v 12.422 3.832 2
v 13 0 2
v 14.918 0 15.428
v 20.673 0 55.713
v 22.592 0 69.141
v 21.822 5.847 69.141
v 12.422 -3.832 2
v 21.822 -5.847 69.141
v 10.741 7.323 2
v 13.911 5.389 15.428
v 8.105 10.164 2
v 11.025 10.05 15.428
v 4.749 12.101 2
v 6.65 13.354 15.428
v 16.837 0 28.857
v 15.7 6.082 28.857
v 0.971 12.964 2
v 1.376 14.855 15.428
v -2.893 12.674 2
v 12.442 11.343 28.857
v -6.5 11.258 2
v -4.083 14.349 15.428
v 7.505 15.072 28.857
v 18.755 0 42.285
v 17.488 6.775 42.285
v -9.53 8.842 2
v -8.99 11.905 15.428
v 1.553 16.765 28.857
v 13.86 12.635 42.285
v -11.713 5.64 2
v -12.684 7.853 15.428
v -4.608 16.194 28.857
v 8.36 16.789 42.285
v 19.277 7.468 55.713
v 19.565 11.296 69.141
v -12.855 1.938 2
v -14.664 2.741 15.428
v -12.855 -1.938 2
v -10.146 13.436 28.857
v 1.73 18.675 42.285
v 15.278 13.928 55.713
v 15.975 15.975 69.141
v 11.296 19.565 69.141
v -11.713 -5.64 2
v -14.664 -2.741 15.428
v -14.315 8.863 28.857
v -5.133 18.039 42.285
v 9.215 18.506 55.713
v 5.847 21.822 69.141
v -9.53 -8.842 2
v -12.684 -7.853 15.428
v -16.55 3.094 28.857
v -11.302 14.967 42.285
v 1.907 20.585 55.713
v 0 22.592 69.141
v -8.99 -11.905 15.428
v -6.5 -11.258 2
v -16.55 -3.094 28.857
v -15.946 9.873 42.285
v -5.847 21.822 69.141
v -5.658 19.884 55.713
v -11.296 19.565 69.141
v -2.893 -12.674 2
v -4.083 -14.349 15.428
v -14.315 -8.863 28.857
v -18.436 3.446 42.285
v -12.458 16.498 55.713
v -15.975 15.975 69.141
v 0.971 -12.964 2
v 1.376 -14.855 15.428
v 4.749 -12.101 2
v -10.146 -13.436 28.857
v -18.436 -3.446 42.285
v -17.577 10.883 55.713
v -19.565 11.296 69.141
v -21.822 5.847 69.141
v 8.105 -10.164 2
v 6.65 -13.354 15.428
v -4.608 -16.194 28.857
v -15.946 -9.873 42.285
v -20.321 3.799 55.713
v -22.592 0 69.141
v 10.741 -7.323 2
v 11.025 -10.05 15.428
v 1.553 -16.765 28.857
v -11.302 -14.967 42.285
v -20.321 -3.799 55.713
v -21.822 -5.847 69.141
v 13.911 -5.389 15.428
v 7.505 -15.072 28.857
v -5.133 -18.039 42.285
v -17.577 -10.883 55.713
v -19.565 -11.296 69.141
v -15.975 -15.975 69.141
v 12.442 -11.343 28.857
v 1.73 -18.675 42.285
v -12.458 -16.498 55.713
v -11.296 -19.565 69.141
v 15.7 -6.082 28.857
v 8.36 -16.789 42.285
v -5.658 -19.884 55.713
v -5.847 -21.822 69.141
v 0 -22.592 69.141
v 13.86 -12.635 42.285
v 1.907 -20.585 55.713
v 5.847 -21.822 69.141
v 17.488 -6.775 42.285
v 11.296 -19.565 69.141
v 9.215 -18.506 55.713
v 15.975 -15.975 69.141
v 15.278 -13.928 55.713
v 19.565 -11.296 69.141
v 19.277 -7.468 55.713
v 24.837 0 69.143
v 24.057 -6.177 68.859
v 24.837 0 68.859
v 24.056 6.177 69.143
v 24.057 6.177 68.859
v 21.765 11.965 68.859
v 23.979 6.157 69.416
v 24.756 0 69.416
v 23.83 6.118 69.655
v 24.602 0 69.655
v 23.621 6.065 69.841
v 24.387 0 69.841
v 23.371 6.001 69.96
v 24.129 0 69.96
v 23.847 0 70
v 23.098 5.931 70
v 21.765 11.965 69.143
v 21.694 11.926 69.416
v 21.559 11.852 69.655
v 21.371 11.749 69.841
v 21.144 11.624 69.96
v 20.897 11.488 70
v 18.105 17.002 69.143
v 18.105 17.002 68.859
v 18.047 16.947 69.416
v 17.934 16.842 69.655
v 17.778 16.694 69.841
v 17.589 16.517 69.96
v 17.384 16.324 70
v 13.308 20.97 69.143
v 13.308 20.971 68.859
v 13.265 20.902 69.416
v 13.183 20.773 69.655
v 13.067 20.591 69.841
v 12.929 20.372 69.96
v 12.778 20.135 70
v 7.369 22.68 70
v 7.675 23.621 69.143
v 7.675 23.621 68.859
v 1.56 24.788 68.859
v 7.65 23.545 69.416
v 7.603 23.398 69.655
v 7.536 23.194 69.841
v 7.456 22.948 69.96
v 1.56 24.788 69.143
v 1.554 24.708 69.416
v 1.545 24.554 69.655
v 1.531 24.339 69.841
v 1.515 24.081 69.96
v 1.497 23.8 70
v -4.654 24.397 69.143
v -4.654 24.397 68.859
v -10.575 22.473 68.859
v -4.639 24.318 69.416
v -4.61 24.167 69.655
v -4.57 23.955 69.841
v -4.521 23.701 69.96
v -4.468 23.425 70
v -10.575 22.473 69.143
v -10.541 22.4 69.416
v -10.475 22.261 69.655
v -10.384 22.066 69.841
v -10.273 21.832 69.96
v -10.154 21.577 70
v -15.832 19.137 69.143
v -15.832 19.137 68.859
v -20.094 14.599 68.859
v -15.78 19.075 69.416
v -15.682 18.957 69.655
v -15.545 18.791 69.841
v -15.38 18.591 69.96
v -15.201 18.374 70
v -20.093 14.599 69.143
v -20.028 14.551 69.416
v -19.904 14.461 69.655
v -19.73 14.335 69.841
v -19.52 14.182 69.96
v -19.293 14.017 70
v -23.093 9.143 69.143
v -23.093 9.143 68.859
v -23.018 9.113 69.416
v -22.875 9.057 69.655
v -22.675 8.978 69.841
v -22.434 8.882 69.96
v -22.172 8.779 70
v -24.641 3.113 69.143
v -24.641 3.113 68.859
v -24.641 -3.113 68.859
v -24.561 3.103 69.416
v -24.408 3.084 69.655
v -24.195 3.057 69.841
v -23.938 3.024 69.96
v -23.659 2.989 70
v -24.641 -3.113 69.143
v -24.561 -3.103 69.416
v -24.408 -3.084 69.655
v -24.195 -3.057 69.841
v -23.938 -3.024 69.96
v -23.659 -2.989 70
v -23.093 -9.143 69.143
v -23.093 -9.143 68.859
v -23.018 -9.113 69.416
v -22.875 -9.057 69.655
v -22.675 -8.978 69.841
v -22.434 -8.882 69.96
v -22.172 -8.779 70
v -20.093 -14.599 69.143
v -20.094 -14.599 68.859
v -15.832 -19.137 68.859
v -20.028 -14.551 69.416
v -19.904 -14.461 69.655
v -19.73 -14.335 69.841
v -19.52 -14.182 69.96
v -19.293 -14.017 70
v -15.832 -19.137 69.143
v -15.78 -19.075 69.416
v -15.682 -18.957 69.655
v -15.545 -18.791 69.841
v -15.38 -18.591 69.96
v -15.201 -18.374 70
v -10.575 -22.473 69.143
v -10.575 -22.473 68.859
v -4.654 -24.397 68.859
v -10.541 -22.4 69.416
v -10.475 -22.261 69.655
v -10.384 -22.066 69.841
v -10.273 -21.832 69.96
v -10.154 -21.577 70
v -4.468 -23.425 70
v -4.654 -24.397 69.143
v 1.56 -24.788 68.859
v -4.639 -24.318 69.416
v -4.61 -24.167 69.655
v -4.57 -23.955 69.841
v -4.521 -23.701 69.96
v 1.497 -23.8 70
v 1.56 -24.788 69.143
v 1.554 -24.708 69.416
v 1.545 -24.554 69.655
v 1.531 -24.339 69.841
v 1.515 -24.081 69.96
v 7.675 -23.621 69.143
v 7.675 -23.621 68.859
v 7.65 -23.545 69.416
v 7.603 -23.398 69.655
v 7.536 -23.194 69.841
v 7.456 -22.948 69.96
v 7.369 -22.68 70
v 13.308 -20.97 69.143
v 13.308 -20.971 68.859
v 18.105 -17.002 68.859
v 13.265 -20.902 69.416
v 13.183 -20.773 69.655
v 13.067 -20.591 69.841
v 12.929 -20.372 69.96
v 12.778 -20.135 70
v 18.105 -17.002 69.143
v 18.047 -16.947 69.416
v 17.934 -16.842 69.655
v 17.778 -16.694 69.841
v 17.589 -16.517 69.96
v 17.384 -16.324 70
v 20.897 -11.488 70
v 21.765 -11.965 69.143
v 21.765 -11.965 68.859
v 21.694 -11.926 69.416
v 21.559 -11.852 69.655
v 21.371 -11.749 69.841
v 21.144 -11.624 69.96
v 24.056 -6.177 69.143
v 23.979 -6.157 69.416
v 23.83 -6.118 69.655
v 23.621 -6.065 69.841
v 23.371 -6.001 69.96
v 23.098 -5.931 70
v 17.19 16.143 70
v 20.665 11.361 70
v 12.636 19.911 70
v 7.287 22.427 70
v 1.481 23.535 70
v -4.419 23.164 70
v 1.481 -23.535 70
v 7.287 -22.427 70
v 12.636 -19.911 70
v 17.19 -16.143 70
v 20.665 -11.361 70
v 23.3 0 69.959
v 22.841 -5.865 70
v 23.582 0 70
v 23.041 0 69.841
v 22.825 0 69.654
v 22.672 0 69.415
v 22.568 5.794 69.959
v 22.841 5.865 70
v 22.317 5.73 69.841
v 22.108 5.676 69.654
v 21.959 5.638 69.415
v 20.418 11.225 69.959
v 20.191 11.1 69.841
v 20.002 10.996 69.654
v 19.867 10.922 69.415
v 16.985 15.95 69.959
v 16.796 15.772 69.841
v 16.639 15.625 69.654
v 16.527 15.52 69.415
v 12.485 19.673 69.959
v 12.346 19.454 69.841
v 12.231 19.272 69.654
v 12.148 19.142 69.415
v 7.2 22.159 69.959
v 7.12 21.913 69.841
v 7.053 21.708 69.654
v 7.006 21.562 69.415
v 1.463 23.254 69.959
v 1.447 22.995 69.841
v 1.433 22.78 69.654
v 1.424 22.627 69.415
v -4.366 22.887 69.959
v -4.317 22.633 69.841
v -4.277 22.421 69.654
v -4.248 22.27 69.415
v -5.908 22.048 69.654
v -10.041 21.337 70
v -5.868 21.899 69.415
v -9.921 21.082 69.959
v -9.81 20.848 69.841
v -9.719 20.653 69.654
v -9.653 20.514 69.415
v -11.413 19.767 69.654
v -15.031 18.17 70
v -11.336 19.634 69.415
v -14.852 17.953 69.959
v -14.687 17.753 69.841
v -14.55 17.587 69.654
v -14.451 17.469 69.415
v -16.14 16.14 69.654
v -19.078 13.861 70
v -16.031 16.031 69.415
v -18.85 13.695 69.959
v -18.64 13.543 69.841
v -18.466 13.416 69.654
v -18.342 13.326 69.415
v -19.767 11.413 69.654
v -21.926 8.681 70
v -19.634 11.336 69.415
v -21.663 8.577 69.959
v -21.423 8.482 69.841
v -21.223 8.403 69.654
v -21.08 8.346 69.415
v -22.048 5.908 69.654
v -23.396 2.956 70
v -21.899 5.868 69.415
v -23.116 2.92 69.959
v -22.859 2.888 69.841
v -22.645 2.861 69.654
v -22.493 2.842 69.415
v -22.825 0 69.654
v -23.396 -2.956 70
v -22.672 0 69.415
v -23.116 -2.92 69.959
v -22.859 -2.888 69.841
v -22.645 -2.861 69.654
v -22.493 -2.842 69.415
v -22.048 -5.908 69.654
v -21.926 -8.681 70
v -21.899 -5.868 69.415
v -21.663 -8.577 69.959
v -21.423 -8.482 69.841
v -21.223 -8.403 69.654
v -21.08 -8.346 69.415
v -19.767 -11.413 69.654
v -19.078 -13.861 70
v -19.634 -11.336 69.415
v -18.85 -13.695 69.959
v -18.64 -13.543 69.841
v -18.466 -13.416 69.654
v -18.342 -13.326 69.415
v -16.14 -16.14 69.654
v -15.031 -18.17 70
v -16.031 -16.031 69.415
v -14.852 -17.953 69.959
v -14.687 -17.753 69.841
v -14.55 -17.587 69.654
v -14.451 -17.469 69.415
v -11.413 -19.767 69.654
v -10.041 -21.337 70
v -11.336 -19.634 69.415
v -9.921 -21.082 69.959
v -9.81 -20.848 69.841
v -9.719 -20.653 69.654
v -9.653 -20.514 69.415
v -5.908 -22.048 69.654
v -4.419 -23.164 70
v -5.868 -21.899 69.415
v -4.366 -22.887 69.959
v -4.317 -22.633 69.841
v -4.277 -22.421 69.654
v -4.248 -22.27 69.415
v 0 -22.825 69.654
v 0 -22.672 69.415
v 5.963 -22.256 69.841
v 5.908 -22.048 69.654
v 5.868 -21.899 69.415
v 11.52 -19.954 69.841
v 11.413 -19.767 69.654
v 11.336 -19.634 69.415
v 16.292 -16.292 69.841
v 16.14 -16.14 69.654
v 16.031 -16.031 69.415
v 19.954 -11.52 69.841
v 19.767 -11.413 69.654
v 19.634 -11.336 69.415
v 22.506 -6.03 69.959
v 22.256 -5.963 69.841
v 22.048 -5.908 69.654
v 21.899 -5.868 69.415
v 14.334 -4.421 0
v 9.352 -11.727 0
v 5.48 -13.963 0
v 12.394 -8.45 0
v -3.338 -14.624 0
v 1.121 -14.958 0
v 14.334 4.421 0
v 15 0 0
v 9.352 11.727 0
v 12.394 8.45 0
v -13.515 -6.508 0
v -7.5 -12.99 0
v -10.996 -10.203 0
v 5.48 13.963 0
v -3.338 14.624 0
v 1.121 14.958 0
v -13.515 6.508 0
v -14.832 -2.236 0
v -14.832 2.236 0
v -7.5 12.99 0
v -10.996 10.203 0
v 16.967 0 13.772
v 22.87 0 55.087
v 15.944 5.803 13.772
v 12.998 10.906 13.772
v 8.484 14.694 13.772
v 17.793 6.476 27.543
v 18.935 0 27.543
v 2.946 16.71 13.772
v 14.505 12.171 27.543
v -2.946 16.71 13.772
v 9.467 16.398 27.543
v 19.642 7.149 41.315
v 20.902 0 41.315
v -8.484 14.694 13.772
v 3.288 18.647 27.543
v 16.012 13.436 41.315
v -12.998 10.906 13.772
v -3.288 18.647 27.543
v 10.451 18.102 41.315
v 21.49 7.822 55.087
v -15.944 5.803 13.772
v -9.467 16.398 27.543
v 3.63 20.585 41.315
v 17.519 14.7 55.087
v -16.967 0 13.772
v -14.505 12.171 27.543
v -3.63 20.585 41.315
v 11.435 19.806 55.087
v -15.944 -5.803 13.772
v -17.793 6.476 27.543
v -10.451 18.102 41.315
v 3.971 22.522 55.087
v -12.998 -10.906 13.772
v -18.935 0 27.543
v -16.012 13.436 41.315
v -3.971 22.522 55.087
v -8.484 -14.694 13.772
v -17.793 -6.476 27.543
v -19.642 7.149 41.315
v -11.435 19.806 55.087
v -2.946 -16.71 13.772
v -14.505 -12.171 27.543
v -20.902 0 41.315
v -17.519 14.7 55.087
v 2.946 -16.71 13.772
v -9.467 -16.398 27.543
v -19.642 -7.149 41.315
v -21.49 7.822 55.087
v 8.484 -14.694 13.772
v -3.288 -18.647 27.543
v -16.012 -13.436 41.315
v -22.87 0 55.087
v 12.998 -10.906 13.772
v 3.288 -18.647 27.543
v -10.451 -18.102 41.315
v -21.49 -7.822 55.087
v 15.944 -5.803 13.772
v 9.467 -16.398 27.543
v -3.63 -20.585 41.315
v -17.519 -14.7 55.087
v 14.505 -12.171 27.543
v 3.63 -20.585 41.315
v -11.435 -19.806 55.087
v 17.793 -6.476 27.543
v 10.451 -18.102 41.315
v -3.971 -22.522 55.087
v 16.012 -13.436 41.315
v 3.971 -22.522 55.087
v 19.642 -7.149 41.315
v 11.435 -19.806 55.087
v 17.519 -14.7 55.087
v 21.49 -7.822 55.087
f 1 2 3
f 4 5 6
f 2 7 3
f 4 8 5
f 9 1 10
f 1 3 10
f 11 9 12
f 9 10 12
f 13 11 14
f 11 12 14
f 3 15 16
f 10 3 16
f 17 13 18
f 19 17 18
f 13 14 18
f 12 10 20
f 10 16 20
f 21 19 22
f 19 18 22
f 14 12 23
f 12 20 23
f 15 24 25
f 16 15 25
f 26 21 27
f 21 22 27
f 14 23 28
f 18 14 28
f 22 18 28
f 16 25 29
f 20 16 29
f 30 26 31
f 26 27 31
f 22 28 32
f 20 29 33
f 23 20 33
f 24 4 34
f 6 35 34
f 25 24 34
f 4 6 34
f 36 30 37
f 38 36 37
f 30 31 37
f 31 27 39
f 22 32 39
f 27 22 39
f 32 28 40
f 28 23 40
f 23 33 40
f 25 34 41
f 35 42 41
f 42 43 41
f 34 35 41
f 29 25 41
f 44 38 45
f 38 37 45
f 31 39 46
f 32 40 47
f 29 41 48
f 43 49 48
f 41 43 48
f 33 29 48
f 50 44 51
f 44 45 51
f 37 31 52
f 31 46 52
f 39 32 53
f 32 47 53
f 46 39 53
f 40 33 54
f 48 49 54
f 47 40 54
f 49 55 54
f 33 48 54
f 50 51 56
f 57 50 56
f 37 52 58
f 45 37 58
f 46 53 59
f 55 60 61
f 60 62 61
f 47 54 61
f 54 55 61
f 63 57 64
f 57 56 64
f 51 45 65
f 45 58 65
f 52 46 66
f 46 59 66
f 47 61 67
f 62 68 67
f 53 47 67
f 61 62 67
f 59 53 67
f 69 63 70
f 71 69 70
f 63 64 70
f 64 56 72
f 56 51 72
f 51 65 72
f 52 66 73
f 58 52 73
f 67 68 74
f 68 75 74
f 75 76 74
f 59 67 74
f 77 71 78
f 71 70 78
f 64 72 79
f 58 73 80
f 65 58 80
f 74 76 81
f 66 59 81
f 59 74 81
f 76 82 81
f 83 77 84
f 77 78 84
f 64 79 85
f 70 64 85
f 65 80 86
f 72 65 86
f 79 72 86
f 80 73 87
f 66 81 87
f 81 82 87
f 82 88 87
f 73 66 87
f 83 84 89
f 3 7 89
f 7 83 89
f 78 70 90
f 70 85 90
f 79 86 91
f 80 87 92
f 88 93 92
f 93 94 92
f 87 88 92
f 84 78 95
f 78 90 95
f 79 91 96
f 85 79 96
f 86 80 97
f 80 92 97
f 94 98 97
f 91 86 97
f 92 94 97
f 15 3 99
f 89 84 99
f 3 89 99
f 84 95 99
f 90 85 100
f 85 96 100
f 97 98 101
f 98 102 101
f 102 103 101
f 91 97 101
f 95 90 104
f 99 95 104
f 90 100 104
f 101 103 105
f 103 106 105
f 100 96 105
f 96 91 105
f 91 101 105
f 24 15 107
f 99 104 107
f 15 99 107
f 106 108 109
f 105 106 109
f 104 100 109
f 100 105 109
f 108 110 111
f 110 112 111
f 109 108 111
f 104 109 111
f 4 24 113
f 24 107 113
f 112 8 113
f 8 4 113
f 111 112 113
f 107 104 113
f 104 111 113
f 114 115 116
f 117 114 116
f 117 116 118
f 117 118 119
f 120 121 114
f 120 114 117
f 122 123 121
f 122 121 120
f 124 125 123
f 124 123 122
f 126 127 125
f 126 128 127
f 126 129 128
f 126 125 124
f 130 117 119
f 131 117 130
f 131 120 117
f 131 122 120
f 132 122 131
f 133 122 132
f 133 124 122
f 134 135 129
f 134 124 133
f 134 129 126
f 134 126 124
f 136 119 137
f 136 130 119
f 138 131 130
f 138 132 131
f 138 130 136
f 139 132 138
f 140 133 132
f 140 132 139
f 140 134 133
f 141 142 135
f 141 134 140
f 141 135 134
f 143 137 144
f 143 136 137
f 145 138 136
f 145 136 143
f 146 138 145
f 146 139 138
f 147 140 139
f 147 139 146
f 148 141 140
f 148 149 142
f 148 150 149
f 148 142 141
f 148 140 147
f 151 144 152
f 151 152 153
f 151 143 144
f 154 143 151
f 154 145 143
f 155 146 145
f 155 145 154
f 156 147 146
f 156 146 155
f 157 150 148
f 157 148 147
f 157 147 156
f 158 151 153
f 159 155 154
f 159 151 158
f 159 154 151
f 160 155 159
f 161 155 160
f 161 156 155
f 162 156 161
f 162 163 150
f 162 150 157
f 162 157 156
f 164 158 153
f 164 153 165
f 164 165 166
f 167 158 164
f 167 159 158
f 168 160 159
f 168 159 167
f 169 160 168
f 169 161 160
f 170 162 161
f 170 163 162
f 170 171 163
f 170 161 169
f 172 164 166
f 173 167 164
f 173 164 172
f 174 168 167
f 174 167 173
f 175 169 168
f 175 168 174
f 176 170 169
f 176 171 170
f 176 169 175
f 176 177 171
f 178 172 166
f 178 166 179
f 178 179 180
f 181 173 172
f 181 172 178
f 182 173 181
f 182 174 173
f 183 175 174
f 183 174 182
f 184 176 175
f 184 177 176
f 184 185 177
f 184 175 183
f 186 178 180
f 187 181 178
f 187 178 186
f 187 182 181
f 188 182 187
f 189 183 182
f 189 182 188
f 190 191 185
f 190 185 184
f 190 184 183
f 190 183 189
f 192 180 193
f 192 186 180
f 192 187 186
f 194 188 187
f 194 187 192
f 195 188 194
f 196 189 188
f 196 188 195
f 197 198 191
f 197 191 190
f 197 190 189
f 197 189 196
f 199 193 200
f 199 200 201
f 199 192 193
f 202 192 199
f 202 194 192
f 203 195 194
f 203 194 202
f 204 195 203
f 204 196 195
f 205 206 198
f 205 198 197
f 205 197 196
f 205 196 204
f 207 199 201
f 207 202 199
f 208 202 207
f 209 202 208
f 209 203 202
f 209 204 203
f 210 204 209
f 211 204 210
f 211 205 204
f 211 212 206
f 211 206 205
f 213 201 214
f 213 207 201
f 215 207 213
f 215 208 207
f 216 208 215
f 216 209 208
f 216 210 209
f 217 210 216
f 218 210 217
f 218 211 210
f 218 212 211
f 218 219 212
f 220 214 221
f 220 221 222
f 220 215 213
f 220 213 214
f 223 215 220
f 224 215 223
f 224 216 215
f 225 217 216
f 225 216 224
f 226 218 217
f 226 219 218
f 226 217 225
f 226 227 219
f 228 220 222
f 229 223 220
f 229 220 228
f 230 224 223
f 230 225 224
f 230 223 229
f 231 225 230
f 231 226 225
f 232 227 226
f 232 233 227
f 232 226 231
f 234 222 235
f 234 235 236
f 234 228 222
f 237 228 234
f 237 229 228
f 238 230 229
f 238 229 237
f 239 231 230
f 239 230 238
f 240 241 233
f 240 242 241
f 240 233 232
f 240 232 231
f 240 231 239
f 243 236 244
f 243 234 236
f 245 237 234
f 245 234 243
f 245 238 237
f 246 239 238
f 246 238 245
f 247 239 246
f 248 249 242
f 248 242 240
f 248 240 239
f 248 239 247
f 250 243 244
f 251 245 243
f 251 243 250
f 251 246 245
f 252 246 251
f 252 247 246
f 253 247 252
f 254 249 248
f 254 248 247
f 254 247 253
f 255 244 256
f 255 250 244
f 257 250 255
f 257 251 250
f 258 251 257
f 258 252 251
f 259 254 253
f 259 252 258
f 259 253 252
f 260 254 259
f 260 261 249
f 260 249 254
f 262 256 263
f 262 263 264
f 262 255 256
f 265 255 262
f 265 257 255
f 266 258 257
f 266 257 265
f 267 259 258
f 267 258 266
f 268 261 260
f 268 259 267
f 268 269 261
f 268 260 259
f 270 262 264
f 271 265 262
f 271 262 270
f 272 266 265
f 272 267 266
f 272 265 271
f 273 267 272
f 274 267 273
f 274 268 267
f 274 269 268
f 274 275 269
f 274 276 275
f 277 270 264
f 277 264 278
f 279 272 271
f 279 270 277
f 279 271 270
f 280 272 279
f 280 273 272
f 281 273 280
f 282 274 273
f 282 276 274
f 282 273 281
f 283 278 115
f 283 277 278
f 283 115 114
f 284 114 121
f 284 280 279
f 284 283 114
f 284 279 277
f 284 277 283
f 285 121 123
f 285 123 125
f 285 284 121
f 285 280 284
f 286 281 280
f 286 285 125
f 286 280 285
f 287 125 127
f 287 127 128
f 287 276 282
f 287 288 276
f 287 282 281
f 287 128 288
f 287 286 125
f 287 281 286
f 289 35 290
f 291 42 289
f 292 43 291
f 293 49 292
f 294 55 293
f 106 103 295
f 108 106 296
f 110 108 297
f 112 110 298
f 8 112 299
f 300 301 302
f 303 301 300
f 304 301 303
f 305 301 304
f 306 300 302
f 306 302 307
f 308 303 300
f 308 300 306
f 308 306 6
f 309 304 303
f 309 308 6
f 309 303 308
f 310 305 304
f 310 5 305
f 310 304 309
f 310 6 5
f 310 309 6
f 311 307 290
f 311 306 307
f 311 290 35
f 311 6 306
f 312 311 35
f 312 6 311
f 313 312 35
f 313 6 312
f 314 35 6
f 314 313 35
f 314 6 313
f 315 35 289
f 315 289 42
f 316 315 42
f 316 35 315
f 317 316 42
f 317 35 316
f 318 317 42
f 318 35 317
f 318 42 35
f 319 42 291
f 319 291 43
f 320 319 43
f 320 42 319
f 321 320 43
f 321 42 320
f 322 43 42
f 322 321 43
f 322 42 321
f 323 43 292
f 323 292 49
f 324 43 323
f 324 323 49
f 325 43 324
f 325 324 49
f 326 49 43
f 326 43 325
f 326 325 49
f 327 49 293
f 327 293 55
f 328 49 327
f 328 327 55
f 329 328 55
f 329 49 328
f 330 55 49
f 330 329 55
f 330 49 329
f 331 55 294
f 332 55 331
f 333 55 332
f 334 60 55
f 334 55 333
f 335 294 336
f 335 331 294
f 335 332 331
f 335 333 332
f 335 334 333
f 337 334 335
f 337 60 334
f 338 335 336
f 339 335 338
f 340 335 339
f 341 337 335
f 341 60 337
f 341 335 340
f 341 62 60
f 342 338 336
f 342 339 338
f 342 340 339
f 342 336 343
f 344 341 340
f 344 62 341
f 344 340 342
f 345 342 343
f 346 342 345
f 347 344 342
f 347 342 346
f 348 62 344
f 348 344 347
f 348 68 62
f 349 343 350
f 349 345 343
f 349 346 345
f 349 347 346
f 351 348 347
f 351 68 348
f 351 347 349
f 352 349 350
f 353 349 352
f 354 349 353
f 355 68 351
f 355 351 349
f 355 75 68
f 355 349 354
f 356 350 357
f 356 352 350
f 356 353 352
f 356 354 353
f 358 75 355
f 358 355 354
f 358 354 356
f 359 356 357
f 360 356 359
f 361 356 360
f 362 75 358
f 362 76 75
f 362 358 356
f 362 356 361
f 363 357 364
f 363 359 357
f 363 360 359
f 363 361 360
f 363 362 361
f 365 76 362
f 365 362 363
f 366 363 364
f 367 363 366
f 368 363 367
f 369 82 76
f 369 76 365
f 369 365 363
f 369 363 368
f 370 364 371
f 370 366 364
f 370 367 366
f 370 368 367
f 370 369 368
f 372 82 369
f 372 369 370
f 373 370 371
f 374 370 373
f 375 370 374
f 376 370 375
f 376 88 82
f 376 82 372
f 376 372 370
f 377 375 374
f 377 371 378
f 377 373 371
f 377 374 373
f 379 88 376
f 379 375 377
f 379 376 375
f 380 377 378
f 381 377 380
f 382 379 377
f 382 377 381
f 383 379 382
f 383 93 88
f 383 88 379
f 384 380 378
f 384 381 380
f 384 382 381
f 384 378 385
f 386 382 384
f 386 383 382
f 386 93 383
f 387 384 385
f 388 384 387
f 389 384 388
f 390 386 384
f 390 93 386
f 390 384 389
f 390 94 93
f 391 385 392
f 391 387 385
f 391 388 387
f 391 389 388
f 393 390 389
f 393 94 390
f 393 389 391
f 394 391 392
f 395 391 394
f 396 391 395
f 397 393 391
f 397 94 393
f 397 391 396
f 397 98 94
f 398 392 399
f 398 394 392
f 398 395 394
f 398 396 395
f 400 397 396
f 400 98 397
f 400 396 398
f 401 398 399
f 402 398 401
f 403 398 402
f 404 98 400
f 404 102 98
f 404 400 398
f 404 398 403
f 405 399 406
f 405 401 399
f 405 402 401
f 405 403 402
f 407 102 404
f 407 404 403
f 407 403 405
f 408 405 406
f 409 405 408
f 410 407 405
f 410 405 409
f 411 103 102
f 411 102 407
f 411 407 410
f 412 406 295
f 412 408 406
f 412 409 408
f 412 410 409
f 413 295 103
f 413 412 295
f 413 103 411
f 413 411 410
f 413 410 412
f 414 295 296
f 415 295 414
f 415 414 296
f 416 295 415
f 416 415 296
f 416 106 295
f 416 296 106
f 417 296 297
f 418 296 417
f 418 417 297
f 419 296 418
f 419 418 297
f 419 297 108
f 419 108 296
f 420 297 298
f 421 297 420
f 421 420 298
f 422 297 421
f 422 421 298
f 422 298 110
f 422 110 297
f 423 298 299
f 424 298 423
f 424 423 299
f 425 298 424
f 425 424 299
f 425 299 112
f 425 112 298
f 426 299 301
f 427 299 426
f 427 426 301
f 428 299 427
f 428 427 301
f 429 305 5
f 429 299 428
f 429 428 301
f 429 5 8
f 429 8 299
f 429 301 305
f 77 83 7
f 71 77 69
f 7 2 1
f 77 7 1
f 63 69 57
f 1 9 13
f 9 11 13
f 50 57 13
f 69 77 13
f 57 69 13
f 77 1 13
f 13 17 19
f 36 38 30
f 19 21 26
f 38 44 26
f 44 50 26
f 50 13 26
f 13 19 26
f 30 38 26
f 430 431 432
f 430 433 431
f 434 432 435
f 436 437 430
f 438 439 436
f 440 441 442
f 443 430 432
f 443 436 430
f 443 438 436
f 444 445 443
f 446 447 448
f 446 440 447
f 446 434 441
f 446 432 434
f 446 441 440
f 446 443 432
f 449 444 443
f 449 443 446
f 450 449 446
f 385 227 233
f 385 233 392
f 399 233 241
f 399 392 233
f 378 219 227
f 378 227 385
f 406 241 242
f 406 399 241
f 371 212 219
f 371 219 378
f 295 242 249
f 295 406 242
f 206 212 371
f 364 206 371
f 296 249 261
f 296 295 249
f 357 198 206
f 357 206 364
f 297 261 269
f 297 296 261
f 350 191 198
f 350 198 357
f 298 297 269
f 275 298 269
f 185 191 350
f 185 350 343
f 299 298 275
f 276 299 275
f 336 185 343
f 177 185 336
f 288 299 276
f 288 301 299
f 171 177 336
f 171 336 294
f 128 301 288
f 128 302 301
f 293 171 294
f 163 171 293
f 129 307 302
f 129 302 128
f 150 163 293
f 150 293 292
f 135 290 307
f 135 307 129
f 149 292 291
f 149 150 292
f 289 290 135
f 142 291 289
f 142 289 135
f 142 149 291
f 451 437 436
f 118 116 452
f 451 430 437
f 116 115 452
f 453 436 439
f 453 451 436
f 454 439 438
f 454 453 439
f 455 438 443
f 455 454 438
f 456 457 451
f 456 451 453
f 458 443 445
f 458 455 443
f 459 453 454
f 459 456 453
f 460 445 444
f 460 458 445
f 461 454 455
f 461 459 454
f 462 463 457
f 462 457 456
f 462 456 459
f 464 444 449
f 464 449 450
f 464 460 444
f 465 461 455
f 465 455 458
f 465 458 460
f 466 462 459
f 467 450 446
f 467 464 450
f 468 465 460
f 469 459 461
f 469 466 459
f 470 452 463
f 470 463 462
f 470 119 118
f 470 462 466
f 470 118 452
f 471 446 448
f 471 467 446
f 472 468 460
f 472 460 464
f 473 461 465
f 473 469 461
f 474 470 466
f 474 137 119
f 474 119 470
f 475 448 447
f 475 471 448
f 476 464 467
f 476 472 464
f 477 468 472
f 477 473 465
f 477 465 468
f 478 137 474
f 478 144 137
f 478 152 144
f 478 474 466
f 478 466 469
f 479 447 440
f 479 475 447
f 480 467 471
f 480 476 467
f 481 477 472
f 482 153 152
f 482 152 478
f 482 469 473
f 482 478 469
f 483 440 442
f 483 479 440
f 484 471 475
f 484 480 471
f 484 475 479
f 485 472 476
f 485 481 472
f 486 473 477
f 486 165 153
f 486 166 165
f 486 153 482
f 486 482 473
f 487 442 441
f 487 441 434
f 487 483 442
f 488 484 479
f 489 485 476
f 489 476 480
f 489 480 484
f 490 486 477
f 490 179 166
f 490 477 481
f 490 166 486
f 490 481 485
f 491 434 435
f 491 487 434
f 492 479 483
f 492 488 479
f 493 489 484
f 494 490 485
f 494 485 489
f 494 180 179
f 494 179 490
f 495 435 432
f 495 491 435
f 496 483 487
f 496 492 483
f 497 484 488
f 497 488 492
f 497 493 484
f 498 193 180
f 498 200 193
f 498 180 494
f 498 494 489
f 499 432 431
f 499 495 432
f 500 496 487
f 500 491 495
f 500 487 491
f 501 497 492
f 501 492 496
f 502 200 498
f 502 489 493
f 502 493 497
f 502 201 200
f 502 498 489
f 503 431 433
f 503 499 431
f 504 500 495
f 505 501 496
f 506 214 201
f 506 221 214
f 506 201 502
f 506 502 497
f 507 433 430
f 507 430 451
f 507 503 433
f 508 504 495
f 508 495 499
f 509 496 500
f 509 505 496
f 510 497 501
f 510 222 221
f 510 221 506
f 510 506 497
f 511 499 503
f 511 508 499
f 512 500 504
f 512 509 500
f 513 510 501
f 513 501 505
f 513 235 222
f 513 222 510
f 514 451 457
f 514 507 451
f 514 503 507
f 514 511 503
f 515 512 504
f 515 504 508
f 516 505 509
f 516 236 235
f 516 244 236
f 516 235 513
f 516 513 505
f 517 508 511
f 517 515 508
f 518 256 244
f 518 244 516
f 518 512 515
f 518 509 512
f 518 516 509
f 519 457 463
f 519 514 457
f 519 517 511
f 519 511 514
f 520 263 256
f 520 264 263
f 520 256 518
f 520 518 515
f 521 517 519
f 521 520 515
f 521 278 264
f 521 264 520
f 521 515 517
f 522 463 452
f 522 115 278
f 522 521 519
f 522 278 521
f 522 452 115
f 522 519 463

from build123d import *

# Parameters (mm, degrees)
FILLET_R = 1


with BuildPart() as vaso_interior:
    # Cone001 → Cone001 (revolve)
    with BuildSketch(Plane(origin=(0, 0, 2), x_dir=(1, 0, 0), z_dir=(0, -1, 0))):
        Polygon((0, 0), (13, 0), (23, 70), (0, 70), align=None)
    revolve(axis=Axis((0, 0, 2), (0, 0, 1)))


with BuildPart() as vaso:
    # Cone → Cone (revolve)
    with BuildSketch(Plane.XZ):
        Polygon((0, 0), (15, 0), (25, 70), (0, 70), align=None)
    revolve(axis=Axis((0, 0, 0), (0, 0, 1)))

    # Cut: cut vaso_interior
    add(vaso_interior.part, mode=Mode.SUBTRACT)

    # Fillet
    fillet_edges = [vaso.edges().sort_by_distance(p)[0] for p in [
        (-25, 0, 70),
        (-22.714286, 0, 70),
    ]]
    fillet(fillet_edges, radius=FILLET_R)


solid = vaso.part
